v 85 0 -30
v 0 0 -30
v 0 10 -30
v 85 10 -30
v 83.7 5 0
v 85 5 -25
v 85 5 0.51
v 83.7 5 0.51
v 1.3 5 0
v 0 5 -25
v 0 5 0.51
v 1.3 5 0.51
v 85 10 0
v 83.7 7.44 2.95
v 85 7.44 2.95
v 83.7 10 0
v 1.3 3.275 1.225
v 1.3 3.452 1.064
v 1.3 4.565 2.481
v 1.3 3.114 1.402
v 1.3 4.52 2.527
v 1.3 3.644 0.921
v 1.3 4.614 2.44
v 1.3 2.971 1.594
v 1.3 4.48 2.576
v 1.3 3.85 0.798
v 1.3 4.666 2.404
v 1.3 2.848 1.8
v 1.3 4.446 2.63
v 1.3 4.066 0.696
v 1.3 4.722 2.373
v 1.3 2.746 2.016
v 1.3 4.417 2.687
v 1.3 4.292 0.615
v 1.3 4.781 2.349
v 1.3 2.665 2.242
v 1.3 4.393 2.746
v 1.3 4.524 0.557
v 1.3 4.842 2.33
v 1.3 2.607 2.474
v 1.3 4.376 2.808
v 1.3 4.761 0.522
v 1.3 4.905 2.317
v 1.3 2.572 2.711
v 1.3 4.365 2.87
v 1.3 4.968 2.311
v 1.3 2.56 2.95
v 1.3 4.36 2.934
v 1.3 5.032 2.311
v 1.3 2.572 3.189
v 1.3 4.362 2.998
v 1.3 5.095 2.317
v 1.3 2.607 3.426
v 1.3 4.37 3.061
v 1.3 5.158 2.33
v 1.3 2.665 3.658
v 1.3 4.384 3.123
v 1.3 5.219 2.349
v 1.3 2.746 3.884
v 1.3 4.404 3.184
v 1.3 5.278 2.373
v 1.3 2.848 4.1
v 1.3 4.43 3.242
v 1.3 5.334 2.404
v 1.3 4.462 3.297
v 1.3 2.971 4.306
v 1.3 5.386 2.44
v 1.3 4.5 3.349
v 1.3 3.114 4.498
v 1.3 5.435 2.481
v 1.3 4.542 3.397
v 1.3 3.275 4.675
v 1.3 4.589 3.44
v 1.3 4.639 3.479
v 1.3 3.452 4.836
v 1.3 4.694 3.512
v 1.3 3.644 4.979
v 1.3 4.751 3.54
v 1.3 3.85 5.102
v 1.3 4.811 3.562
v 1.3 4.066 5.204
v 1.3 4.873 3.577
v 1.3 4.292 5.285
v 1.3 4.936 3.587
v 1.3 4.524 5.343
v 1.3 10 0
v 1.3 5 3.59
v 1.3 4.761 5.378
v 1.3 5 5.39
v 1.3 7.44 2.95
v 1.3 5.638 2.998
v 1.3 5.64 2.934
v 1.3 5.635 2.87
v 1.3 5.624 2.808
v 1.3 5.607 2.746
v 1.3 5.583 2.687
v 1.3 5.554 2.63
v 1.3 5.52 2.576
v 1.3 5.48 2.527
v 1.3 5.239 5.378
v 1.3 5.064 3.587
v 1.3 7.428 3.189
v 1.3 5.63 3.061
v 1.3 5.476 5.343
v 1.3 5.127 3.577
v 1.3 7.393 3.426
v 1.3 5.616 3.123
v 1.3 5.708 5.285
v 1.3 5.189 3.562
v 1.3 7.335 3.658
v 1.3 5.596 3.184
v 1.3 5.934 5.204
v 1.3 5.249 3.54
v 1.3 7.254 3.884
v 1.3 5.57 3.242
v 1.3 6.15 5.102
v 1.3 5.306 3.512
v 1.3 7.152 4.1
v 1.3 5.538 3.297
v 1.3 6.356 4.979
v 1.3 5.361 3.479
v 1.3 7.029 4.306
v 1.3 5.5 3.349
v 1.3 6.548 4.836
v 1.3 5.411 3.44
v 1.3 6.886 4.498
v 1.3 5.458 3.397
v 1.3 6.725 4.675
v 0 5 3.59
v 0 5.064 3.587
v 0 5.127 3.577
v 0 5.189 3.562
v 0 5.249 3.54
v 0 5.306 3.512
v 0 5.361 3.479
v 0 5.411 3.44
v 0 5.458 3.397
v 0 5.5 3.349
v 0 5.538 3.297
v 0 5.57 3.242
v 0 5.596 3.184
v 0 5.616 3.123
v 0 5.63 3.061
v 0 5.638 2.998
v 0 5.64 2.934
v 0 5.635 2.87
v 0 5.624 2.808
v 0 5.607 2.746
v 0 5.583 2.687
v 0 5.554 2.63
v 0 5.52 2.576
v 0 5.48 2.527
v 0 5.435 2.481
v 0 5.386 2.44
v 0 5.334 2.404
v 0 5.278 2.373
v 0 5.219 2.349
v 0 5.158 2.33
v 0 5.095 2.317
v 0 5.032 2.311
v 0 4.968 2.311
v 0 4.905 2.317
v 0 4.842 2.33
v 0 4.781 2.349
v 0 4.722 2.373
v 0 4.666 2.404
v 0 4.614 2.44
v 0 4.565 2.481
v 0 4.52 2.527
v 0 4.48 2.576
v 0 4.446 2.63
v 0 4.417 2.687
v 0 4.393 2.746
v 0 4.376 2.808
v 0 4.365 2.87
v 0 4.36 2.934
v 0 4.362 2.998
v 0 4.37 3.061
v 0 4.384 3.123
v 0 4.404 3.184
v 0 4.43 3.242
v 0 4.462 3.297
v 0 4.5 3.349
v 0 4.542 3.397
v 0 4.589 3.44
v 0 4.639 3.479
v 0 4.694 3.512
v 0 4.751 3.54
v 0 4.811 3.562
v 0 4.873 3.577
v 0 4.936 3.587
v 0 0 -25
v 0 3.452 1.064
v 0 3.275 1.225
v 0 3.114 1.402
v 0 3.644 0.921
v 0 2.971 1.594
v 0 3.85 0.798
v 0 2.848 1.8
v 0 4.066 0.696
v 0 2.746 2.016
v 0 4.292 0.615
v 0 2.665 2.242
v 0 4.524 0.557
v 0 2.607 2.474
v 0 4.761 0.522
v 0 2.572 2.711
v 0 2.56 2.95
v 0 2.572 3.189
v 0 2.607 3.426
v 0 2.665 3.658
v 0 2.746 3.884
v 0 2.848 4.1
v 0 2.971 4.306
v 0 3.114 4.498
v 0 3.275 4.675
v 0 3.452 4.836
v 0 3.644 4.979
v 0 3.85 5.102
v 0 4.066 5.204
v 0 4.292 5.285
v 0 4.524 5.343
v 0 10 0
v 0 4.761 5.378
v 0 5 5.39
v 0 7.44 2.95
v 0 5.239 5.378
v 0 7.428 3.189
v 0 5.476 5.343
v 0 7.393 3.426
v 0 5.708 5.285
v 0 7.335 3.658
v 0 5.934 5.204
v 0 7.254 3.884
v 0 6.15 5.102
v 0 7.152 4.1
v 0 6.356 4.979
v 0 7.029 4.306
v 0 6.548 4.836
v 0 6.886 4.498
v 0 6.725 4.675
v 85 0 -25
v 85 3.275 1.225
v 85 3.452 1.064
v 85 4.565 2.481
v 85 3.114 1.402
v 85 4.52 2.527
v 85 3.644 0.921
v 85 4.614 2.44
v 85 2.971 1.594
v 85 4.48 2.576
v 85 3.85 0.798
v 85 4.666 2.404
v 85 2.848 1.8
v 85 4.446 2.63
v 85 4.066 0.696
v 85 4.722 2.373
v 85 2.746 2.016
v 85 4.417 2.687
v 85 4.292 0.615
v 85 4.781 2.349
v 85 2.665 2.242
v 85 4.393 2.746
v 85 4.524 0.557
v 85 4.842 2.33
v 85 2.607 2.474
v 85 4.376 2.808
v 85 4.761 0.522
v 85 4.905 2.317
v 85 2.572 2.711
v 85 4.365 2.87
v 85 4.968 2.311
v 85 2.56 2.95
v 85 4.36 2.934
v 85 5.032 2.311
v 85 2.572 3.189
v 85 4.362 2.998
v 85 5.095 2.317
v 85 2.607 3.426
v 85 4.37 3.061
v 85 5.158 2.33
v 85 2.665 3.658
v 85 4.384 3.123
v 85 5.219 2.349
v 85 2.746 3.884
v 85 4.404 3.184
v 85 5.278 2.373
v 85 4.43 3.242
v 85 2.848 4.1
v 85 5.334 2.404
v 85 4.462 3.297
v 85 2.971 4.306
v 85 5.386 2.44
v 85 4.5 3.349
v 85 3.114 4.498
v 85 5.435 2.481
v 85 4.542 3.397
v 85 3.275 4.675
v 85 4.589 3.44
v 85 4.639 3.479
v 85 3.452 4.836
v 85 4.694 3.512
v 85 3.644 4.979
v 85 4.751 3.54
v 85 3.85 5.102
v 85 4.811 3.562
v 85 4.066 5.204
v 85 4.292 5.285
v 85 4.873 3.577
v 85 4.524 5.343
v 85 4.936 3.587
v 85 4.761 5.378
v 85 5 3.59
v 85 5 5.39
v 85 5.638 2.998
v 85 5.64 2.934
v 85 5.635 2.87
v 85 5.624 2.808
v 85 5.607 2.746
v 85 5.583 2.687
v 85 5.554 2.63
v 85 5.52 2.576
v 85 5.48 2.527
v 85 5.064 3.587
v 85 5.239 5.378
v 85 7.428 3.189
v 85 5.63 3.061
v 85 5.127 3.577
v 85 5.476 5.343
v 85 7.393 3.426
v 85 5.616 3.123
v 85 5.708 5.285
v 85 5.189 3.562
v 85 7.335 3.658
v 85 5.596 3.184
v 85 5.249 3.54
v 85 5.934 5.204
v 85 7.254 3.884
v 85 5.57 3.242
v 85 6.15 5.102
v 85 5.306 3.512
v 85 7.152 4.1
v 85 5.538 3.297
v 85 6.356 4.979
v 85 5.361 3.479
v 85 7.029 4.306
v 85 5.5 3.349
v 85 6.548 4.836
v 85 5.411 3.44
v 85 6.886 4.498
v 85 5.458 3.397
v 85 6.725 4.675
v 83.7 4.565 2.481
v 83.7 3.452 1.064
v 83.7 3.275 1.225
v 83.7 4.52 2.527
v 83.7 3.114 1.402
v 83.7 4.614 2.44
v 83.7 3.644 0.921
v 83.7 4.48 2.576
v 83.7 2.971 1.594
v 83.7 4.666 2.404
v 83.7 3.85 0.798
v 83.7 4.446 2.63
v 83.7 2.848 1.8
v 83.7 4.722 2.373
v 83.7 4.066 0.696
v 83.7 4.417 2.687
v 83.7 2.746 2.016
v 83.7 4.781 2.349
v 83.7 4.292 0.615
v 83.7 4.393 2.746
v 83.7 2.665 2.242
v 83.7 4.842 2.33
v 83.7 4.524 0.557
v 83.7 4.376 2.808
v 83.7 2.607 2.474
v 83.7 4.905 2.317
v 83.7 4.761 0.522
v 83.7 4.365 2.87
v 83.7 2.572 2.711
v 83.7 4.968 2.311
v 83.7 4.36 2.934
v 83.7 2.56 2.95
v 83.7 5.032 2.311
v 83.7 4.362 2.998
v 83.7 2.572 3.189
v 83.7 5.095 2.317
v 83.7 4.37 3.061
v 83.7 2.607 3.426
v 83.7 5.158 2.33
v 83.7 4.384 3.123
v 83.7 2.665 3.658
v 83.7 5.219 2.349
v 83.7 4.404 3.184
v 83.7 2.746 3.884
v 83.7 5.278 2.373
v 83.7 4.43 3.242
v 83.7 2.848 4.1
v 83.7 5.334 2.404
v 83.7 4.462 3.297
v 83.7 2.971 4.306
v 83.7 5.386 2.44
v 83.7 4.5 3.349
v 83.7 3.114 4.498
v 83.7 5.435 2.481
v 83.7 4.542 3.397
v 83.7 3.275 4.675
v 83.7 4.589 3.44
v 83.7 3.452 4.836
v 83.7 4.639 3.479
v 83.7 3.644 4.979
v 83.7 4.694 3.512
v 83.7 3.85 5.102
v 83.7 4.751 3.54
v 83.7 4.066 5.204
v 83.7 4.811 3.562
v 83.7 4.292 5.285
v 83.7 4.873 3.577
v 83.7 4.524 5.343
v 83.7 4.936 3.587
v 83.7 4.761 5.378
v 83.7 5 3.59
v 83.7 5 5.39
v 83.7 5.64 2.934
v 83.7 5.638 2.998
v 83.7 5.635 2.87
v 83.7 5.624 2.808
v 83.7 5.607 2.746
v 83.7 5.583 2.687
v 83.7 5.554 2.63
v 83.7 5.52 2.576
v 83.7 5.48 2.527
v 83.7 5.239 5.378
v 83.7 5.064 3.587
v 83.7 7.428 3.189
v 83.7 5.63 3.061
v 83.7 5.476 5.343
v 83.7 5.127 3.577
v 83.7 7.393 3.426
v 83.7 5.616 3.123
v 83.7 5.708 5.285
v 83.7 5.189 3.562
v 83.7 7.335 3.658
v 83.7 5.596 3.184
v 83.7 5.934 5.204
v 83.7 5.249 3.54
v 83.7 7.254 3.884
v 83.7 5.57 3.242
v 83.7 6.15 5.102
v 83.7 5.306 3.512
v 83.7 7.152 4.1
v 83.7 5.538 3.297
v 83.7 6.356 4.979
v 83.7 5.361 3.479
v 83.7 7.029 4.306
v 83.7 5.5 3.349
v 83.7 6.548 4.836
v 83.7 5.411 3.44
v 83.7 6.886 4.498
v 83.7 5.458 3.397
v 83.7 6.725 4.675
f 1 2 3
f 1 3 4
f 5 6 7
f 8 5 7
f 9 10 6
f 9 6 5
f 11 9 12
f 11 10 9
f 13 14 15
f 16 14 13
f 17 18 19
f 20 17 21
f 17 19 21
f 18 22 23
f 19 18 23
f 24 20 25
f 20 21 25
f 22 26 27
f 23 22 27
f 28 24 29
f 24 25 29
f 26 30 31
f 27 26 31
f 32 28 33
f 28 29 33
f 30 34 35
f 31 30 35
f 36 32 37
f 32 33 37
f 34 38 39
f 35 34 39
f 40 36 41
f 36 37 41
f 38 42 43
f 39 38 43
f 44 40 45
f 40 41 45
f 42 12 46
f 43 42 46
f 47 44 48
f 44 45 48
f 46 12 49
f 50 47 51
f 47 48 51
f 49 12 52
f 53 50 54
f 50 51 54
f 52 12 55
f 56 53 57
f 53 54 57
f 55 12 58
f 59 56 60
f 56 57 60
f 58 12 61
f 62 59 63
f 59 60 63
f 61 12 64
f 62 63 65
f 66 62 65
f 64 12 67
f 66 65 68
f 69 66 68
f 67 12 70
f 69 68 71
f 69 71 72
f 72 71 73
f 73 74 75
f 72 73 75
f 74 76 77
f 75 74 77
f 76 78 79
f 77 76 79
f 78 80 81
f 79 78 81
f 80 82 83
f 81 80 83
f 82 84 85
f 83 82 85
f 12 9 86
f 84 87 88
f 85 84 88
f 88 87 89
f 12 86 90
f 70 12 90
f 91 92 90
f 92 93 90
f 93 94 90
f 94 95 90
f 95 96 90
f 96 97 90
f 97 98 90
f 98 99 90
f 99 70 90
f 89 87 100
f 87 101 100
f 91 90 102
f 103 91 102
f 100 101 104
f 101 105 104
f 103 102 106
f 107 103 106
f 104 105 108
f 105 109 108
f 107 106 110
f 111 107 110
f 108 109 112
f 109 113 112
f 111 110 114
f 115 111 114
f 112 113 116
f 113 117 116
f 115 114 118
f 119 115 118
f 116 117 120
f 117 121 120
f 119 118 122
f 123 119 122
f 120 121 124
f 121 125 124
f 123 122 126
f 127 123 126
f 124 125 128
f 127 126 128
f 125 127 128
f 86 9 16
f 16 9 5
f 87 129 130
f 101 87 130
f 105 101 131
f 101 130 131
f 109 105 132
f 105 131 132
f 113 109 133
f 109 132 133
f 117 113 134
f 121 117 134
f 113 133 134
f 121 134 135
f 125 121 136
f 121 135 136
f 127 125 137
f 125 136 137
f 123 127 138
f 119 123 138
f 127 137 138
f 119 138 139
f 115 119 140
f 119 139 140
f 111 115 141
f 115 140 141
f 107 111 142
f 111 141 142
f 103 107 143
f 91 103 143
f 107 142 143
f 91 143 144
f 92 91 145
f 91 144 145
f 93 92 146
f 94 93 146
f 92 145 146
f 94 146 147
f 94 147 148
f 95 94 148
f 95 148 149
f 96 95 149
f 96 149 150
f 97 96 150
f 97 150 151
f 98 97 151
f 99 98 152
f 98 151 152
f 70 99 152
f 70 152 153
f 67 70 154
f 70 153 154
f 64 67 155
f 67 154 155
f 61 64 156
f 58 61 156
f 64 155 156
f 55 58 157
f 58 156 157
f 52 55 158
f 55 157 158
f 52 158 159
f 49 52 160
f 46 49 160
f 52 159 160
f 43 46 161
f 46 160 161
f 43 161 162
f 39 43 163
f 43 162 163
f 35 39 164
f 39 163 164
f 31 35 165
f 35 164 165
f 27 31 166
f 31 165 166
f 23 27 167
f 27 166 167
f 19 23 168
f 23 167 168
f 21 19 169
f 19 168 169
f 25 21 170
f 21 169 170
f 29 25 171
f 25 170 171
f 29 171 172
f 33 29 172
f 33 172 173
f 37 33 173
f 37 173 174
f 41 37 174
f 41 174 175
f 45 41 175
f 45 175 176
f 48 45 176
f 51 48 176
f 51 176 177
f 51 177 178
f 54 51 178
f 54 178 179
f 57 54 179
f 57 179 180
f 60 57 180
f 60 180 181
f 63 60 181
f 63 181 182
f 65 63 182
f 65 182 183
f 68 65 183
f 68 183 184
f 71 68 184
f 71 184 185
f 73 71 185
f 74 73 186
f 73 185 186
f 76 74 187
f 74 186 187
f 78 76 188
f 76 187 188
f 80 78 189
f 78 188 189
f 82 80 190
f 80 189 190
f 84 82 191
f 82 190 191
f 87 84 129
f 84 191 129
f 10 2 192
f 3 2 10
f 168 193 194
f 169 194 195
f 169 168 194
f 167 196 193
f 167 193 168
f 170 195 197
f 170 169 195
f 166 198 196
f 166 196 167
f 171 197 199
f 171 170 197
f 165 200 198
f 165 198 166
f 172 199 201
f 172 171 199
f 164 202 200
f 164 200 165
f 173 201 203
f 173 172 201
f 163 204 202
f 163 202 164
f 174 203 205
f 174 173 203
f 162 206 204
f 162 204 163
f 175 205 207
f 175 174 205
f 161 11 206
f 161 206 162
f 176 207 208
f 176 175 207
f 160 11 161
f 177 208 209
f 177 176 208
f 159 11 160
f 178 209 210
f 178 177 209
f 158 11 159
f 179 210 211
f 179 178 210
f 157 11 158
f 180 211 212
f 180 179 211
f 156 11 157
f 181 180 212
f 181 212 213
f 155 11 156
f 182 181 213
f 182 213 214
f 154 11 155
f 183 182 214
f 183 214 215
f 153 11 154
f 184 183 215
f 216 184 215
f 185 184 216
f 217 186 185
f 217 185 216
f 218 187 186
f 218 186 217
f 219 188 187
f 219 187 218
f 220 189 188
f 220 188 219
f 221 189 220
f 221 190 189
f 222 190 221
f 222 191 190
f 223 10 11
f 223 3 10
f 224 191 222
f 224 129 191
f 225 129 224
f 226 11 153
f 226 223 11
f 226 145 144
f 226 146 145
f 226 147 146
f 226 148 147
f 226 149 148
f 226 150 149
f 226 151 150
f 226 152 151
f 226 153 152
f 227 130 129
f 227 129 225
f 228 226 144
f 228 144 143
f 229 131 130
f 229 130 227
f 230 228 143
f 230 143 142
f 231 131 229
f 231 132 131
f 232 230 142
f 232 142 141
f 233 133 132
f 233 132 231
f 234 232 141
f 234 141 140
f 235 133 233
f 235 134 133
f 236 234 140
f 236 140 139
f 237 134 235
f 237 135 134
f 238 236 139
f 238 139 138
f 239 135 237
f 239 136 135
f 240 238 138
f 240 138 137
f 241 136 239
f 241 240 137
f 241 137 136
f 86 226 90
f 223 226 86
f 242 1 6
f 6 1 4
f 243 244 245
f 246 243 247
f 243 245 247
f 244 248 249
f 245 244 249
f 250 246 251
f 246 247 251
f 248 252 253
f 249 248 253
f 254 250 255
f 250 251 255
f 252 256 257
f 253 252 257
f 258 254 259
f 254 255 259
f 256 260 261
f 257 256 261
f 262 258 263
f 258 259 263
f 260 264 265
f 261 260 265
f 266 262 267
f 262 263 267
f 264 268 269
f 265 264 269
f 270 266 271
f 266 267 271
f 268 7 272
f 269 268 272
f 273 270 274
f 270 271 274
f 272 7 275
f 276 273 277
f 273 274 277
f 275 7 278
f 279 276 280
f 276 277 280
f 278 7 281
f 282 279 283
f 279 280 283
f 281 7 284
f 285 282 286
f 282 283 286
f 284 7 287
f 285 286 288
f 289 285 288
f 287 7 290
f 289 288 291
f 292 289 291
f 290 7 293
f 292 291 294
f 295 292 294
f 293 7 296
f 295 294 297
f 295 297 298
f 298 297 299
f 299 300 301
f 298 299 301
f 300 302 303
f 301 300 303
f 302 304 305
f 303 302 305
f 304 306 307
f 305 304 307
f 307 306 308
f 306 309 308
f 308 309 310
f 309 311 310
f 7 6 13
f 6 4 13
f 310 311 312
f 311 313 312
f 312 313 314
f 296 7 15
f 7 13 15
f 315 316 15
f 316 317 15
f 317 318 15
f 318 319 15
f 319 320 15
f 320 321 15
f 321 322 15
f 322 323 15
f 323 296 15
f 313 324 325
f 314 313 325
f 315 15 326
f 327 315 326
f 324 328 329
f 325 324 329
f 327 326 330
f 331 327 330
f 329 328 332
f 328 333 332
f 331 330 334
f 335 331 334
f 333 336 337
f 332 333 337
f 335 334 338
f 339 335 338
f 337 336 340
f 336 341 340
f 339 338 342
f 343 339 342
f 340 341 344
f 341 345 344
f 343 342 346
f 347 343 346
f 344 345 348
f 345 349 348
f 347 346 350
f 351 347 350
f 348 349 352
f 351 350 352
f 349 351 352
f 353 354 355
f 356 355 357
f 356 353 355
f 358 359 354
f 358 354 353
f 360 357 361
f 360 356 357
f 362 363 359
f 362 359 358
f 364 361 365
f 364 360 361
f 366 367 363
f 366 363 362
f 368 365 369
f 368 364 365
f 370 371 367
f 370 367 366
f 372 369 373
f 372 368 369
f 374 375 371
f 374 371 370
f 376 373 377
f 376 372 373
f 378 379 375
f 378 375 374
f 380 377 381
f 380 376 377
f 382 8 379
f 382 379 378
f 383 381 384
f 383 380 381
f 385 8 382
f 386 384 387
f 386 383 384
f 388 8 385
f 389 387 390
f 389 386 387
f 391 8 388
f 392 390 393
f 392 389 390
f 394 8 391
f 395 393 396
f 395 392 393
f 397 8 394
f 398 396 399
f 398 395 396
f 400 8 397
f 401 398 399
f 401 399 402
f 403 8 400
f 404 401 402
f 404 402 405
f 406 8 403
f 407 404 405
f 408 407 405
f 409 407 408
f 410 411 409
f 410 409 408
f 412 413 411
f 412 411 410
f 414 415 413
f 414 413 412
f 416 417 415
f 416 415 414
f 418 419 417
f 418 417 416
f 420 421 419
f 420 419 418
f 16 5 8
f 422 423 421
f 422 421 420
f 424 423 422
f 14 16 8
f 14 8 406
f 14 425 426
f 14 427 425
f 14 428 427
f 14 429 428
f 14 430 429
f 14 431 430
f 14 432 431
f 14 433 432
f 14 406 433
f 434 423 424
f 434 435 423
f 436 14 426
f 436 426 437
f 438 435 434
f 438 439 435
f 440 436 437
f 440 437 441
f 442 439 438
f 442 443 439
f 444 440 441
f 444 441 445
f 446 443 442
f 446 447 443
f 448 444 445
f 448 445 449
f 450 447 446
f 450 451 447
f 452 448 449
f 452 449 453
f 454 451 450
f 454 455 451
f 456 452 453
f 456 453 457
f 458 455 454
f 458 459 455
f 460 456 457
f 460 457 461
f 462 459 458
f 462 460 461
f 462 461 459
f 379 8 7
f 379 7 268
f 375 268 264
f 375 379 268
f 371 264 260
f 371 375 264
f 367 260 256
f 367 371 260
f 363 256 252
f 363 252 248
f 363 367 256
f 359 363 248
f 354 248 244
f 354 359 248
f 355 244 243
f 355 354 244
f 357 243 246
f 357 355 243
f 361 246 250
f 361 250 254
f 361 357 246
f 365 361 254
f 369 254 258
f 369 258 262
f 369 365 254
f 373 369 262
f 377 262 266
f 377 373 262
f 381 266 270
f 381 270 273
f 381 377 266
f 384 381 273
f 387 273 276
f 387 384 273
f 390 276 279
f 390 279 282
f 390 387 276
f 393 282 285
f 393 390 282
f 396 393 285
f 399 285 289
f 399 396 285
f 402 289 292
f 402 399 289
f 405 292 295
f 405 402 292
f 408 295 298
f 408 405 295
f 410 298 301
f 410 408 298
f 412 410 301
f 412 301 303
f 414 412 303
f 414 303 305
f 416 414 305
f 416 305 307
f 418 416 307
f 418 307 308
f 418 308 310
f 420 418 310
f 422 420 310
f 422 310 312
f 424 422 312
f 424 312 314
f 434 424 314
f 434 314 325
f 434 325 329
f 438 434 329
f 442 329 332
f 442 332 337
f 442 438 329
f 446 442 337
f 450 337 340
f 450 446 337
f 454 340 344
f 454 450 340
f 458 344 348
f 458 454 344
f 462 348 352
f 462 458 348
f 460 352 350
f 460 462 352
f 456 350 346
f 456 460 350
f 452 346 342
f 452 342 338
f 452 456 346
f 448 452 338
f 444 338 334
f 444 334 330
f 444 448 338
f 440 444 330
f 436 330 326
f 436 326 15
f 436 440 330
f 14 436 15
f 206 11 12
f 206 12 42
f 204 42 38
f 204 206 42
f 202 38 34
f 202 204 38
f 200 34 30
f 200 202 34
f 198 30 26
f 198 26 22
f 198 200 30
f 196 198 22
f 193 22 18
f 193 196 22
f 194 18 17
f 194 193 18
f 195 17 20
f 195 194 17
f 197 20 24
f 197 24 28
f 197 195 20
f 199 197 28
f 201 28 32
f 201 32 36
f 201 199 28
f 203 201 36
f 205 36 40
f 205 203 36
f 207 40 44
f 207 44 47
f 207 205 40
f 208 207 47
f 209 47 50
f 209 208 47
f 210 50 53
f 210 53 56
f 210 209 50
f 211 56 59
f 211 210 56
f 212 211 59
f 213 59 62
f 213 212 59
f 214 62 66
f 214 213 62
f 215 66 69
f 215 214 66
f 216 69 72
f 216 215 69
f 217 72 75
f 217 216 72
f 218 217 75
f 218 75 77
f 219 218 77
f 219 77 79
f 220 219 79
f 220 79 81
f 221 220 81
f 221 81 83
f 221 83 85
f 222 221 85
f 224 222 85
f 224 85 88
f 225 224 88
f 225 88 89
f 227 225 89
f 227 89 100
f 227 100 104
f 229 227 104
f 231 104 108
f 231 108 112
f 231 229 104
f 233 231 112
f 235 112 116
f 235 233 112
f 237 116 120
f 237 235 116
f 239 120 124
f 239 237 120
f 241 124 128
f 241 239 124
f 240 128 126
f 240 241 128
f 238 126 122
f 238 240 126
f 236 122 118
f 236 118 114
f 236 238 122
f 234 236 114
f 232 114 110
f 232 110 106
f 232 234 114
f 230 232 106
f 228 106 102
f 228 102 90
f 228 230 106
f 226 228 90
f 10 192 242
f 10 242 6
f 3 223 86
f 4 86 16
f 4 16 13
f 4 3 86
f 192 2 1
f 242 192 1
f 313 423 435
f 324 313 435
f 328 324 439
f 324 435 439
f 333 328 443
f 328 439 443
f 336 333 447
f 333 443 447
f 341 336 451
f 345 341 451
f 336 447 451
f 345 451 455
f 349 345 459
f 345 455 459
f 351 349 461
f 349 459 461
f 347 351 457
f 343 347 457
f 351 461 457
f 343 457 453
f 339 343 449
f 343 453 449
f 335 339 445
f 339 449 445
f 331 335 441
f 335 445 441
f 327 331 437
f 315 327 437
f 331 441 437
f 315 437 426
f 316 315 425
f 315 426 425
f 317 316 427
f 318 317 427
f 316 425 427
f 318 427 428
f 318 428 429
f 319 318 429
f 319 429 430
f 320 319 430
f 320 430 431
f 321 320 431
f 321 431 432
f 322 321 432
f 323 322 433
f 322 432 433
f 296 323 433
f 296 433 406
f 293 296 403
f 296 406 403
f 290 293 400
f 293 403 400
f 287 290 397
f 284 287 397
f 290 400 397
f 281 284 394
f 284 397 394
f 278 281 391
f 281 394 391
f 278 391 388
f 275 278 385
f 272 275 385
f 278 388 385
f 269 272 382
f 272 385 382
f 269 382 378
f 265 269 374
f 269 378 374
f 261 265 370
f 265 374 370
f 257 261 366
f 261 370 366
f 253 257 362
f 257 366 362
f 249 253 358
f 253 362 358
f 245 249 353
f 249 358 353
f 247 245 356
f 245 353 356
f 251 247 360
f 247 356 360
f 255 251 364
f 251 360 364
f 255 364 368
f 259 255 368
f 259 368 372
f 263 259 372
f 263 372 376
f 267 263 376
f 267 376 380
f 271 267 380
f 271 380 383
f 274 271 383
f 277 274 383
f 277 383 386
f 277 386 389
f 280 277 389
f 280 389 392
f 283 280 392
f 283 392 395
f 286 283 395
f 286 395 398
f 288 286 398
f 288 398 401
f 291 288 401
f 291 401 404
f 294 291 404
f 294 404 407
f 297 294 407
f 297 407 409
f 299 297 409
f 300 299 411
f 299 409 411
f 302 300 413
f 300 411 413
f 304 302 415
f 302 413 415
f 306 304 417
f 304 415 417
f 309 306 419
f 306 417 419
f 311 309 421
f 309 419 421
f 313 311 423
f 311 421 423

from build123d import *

# Parameters (mm, degrees)
SKETCH1_W             = 85
SKETCH1_H             = 30
TOP_SURFACE_DEPTH     = 10
SKETCH6_W             = 25
SKETCH6_H             = 5
TOP_SURFACE_CUT_DEPTH = 91.691785736
SKETCH16_R            = 0.64
BOSS_EXTRUDE14_DEPTH  = 1.3
LPATTERN3_COUNT       = 2
LPATTERN3_PITCH       = 83.7


with BuildPart() as part:
    # Sketch1 → Top surface (new body)
    with BuildSketch(Plane(origin=(0, 0, 0), x_dir=(1, 0, 0), z_dir=(0, 1, 0))):
        with Locations((42.5, 15)):
            Rectangle(SKETCH1_W, SKETCH1_H)
    extrude(amount=TOP_SURFACE_DEPTH)

    # Sketch6 → Top surface cut (cut, through all)
    with BuildSketch(Plane.ZY):
        with Locations((-12.5, 2.5)):
            Rectangle(SKETCH6_W, SKETCH6_H)
    extrude(amount=-TOP_SURFACE_CUT_DEPTH, mode=Mode.SUBTRACT)

    # Sketch16 → Boss-Extrude14 (add)
    with BuildSketch(Plane.ZY):
        with BuildLine():
            Line((0, 10), (0, 5))
            Line((0, 5), (0.51, 5))
            ThreePointArc((0.51, 5), (4.675340546, 3.274659454), (2.95, 7.44))
            Line((2.95, 7.44), (0, 10))
        make_face()
        with Locations((2.95, 5)):
            Circle(SKETCH16_R, mode=Mode.SUBTRACT)
    boss_extrude14 = extrude(amount=-BOSS_EXTRUDE14_DEPTH)

    # LPattern3: Boss-Extrude14 ×2
    with Locations(*[(i * LPATTERN3_PITCH, 0, 0) for i in range(1, LPATTERN3_COUNT)]):
        add(boss_extrude14)


solid = part.part
